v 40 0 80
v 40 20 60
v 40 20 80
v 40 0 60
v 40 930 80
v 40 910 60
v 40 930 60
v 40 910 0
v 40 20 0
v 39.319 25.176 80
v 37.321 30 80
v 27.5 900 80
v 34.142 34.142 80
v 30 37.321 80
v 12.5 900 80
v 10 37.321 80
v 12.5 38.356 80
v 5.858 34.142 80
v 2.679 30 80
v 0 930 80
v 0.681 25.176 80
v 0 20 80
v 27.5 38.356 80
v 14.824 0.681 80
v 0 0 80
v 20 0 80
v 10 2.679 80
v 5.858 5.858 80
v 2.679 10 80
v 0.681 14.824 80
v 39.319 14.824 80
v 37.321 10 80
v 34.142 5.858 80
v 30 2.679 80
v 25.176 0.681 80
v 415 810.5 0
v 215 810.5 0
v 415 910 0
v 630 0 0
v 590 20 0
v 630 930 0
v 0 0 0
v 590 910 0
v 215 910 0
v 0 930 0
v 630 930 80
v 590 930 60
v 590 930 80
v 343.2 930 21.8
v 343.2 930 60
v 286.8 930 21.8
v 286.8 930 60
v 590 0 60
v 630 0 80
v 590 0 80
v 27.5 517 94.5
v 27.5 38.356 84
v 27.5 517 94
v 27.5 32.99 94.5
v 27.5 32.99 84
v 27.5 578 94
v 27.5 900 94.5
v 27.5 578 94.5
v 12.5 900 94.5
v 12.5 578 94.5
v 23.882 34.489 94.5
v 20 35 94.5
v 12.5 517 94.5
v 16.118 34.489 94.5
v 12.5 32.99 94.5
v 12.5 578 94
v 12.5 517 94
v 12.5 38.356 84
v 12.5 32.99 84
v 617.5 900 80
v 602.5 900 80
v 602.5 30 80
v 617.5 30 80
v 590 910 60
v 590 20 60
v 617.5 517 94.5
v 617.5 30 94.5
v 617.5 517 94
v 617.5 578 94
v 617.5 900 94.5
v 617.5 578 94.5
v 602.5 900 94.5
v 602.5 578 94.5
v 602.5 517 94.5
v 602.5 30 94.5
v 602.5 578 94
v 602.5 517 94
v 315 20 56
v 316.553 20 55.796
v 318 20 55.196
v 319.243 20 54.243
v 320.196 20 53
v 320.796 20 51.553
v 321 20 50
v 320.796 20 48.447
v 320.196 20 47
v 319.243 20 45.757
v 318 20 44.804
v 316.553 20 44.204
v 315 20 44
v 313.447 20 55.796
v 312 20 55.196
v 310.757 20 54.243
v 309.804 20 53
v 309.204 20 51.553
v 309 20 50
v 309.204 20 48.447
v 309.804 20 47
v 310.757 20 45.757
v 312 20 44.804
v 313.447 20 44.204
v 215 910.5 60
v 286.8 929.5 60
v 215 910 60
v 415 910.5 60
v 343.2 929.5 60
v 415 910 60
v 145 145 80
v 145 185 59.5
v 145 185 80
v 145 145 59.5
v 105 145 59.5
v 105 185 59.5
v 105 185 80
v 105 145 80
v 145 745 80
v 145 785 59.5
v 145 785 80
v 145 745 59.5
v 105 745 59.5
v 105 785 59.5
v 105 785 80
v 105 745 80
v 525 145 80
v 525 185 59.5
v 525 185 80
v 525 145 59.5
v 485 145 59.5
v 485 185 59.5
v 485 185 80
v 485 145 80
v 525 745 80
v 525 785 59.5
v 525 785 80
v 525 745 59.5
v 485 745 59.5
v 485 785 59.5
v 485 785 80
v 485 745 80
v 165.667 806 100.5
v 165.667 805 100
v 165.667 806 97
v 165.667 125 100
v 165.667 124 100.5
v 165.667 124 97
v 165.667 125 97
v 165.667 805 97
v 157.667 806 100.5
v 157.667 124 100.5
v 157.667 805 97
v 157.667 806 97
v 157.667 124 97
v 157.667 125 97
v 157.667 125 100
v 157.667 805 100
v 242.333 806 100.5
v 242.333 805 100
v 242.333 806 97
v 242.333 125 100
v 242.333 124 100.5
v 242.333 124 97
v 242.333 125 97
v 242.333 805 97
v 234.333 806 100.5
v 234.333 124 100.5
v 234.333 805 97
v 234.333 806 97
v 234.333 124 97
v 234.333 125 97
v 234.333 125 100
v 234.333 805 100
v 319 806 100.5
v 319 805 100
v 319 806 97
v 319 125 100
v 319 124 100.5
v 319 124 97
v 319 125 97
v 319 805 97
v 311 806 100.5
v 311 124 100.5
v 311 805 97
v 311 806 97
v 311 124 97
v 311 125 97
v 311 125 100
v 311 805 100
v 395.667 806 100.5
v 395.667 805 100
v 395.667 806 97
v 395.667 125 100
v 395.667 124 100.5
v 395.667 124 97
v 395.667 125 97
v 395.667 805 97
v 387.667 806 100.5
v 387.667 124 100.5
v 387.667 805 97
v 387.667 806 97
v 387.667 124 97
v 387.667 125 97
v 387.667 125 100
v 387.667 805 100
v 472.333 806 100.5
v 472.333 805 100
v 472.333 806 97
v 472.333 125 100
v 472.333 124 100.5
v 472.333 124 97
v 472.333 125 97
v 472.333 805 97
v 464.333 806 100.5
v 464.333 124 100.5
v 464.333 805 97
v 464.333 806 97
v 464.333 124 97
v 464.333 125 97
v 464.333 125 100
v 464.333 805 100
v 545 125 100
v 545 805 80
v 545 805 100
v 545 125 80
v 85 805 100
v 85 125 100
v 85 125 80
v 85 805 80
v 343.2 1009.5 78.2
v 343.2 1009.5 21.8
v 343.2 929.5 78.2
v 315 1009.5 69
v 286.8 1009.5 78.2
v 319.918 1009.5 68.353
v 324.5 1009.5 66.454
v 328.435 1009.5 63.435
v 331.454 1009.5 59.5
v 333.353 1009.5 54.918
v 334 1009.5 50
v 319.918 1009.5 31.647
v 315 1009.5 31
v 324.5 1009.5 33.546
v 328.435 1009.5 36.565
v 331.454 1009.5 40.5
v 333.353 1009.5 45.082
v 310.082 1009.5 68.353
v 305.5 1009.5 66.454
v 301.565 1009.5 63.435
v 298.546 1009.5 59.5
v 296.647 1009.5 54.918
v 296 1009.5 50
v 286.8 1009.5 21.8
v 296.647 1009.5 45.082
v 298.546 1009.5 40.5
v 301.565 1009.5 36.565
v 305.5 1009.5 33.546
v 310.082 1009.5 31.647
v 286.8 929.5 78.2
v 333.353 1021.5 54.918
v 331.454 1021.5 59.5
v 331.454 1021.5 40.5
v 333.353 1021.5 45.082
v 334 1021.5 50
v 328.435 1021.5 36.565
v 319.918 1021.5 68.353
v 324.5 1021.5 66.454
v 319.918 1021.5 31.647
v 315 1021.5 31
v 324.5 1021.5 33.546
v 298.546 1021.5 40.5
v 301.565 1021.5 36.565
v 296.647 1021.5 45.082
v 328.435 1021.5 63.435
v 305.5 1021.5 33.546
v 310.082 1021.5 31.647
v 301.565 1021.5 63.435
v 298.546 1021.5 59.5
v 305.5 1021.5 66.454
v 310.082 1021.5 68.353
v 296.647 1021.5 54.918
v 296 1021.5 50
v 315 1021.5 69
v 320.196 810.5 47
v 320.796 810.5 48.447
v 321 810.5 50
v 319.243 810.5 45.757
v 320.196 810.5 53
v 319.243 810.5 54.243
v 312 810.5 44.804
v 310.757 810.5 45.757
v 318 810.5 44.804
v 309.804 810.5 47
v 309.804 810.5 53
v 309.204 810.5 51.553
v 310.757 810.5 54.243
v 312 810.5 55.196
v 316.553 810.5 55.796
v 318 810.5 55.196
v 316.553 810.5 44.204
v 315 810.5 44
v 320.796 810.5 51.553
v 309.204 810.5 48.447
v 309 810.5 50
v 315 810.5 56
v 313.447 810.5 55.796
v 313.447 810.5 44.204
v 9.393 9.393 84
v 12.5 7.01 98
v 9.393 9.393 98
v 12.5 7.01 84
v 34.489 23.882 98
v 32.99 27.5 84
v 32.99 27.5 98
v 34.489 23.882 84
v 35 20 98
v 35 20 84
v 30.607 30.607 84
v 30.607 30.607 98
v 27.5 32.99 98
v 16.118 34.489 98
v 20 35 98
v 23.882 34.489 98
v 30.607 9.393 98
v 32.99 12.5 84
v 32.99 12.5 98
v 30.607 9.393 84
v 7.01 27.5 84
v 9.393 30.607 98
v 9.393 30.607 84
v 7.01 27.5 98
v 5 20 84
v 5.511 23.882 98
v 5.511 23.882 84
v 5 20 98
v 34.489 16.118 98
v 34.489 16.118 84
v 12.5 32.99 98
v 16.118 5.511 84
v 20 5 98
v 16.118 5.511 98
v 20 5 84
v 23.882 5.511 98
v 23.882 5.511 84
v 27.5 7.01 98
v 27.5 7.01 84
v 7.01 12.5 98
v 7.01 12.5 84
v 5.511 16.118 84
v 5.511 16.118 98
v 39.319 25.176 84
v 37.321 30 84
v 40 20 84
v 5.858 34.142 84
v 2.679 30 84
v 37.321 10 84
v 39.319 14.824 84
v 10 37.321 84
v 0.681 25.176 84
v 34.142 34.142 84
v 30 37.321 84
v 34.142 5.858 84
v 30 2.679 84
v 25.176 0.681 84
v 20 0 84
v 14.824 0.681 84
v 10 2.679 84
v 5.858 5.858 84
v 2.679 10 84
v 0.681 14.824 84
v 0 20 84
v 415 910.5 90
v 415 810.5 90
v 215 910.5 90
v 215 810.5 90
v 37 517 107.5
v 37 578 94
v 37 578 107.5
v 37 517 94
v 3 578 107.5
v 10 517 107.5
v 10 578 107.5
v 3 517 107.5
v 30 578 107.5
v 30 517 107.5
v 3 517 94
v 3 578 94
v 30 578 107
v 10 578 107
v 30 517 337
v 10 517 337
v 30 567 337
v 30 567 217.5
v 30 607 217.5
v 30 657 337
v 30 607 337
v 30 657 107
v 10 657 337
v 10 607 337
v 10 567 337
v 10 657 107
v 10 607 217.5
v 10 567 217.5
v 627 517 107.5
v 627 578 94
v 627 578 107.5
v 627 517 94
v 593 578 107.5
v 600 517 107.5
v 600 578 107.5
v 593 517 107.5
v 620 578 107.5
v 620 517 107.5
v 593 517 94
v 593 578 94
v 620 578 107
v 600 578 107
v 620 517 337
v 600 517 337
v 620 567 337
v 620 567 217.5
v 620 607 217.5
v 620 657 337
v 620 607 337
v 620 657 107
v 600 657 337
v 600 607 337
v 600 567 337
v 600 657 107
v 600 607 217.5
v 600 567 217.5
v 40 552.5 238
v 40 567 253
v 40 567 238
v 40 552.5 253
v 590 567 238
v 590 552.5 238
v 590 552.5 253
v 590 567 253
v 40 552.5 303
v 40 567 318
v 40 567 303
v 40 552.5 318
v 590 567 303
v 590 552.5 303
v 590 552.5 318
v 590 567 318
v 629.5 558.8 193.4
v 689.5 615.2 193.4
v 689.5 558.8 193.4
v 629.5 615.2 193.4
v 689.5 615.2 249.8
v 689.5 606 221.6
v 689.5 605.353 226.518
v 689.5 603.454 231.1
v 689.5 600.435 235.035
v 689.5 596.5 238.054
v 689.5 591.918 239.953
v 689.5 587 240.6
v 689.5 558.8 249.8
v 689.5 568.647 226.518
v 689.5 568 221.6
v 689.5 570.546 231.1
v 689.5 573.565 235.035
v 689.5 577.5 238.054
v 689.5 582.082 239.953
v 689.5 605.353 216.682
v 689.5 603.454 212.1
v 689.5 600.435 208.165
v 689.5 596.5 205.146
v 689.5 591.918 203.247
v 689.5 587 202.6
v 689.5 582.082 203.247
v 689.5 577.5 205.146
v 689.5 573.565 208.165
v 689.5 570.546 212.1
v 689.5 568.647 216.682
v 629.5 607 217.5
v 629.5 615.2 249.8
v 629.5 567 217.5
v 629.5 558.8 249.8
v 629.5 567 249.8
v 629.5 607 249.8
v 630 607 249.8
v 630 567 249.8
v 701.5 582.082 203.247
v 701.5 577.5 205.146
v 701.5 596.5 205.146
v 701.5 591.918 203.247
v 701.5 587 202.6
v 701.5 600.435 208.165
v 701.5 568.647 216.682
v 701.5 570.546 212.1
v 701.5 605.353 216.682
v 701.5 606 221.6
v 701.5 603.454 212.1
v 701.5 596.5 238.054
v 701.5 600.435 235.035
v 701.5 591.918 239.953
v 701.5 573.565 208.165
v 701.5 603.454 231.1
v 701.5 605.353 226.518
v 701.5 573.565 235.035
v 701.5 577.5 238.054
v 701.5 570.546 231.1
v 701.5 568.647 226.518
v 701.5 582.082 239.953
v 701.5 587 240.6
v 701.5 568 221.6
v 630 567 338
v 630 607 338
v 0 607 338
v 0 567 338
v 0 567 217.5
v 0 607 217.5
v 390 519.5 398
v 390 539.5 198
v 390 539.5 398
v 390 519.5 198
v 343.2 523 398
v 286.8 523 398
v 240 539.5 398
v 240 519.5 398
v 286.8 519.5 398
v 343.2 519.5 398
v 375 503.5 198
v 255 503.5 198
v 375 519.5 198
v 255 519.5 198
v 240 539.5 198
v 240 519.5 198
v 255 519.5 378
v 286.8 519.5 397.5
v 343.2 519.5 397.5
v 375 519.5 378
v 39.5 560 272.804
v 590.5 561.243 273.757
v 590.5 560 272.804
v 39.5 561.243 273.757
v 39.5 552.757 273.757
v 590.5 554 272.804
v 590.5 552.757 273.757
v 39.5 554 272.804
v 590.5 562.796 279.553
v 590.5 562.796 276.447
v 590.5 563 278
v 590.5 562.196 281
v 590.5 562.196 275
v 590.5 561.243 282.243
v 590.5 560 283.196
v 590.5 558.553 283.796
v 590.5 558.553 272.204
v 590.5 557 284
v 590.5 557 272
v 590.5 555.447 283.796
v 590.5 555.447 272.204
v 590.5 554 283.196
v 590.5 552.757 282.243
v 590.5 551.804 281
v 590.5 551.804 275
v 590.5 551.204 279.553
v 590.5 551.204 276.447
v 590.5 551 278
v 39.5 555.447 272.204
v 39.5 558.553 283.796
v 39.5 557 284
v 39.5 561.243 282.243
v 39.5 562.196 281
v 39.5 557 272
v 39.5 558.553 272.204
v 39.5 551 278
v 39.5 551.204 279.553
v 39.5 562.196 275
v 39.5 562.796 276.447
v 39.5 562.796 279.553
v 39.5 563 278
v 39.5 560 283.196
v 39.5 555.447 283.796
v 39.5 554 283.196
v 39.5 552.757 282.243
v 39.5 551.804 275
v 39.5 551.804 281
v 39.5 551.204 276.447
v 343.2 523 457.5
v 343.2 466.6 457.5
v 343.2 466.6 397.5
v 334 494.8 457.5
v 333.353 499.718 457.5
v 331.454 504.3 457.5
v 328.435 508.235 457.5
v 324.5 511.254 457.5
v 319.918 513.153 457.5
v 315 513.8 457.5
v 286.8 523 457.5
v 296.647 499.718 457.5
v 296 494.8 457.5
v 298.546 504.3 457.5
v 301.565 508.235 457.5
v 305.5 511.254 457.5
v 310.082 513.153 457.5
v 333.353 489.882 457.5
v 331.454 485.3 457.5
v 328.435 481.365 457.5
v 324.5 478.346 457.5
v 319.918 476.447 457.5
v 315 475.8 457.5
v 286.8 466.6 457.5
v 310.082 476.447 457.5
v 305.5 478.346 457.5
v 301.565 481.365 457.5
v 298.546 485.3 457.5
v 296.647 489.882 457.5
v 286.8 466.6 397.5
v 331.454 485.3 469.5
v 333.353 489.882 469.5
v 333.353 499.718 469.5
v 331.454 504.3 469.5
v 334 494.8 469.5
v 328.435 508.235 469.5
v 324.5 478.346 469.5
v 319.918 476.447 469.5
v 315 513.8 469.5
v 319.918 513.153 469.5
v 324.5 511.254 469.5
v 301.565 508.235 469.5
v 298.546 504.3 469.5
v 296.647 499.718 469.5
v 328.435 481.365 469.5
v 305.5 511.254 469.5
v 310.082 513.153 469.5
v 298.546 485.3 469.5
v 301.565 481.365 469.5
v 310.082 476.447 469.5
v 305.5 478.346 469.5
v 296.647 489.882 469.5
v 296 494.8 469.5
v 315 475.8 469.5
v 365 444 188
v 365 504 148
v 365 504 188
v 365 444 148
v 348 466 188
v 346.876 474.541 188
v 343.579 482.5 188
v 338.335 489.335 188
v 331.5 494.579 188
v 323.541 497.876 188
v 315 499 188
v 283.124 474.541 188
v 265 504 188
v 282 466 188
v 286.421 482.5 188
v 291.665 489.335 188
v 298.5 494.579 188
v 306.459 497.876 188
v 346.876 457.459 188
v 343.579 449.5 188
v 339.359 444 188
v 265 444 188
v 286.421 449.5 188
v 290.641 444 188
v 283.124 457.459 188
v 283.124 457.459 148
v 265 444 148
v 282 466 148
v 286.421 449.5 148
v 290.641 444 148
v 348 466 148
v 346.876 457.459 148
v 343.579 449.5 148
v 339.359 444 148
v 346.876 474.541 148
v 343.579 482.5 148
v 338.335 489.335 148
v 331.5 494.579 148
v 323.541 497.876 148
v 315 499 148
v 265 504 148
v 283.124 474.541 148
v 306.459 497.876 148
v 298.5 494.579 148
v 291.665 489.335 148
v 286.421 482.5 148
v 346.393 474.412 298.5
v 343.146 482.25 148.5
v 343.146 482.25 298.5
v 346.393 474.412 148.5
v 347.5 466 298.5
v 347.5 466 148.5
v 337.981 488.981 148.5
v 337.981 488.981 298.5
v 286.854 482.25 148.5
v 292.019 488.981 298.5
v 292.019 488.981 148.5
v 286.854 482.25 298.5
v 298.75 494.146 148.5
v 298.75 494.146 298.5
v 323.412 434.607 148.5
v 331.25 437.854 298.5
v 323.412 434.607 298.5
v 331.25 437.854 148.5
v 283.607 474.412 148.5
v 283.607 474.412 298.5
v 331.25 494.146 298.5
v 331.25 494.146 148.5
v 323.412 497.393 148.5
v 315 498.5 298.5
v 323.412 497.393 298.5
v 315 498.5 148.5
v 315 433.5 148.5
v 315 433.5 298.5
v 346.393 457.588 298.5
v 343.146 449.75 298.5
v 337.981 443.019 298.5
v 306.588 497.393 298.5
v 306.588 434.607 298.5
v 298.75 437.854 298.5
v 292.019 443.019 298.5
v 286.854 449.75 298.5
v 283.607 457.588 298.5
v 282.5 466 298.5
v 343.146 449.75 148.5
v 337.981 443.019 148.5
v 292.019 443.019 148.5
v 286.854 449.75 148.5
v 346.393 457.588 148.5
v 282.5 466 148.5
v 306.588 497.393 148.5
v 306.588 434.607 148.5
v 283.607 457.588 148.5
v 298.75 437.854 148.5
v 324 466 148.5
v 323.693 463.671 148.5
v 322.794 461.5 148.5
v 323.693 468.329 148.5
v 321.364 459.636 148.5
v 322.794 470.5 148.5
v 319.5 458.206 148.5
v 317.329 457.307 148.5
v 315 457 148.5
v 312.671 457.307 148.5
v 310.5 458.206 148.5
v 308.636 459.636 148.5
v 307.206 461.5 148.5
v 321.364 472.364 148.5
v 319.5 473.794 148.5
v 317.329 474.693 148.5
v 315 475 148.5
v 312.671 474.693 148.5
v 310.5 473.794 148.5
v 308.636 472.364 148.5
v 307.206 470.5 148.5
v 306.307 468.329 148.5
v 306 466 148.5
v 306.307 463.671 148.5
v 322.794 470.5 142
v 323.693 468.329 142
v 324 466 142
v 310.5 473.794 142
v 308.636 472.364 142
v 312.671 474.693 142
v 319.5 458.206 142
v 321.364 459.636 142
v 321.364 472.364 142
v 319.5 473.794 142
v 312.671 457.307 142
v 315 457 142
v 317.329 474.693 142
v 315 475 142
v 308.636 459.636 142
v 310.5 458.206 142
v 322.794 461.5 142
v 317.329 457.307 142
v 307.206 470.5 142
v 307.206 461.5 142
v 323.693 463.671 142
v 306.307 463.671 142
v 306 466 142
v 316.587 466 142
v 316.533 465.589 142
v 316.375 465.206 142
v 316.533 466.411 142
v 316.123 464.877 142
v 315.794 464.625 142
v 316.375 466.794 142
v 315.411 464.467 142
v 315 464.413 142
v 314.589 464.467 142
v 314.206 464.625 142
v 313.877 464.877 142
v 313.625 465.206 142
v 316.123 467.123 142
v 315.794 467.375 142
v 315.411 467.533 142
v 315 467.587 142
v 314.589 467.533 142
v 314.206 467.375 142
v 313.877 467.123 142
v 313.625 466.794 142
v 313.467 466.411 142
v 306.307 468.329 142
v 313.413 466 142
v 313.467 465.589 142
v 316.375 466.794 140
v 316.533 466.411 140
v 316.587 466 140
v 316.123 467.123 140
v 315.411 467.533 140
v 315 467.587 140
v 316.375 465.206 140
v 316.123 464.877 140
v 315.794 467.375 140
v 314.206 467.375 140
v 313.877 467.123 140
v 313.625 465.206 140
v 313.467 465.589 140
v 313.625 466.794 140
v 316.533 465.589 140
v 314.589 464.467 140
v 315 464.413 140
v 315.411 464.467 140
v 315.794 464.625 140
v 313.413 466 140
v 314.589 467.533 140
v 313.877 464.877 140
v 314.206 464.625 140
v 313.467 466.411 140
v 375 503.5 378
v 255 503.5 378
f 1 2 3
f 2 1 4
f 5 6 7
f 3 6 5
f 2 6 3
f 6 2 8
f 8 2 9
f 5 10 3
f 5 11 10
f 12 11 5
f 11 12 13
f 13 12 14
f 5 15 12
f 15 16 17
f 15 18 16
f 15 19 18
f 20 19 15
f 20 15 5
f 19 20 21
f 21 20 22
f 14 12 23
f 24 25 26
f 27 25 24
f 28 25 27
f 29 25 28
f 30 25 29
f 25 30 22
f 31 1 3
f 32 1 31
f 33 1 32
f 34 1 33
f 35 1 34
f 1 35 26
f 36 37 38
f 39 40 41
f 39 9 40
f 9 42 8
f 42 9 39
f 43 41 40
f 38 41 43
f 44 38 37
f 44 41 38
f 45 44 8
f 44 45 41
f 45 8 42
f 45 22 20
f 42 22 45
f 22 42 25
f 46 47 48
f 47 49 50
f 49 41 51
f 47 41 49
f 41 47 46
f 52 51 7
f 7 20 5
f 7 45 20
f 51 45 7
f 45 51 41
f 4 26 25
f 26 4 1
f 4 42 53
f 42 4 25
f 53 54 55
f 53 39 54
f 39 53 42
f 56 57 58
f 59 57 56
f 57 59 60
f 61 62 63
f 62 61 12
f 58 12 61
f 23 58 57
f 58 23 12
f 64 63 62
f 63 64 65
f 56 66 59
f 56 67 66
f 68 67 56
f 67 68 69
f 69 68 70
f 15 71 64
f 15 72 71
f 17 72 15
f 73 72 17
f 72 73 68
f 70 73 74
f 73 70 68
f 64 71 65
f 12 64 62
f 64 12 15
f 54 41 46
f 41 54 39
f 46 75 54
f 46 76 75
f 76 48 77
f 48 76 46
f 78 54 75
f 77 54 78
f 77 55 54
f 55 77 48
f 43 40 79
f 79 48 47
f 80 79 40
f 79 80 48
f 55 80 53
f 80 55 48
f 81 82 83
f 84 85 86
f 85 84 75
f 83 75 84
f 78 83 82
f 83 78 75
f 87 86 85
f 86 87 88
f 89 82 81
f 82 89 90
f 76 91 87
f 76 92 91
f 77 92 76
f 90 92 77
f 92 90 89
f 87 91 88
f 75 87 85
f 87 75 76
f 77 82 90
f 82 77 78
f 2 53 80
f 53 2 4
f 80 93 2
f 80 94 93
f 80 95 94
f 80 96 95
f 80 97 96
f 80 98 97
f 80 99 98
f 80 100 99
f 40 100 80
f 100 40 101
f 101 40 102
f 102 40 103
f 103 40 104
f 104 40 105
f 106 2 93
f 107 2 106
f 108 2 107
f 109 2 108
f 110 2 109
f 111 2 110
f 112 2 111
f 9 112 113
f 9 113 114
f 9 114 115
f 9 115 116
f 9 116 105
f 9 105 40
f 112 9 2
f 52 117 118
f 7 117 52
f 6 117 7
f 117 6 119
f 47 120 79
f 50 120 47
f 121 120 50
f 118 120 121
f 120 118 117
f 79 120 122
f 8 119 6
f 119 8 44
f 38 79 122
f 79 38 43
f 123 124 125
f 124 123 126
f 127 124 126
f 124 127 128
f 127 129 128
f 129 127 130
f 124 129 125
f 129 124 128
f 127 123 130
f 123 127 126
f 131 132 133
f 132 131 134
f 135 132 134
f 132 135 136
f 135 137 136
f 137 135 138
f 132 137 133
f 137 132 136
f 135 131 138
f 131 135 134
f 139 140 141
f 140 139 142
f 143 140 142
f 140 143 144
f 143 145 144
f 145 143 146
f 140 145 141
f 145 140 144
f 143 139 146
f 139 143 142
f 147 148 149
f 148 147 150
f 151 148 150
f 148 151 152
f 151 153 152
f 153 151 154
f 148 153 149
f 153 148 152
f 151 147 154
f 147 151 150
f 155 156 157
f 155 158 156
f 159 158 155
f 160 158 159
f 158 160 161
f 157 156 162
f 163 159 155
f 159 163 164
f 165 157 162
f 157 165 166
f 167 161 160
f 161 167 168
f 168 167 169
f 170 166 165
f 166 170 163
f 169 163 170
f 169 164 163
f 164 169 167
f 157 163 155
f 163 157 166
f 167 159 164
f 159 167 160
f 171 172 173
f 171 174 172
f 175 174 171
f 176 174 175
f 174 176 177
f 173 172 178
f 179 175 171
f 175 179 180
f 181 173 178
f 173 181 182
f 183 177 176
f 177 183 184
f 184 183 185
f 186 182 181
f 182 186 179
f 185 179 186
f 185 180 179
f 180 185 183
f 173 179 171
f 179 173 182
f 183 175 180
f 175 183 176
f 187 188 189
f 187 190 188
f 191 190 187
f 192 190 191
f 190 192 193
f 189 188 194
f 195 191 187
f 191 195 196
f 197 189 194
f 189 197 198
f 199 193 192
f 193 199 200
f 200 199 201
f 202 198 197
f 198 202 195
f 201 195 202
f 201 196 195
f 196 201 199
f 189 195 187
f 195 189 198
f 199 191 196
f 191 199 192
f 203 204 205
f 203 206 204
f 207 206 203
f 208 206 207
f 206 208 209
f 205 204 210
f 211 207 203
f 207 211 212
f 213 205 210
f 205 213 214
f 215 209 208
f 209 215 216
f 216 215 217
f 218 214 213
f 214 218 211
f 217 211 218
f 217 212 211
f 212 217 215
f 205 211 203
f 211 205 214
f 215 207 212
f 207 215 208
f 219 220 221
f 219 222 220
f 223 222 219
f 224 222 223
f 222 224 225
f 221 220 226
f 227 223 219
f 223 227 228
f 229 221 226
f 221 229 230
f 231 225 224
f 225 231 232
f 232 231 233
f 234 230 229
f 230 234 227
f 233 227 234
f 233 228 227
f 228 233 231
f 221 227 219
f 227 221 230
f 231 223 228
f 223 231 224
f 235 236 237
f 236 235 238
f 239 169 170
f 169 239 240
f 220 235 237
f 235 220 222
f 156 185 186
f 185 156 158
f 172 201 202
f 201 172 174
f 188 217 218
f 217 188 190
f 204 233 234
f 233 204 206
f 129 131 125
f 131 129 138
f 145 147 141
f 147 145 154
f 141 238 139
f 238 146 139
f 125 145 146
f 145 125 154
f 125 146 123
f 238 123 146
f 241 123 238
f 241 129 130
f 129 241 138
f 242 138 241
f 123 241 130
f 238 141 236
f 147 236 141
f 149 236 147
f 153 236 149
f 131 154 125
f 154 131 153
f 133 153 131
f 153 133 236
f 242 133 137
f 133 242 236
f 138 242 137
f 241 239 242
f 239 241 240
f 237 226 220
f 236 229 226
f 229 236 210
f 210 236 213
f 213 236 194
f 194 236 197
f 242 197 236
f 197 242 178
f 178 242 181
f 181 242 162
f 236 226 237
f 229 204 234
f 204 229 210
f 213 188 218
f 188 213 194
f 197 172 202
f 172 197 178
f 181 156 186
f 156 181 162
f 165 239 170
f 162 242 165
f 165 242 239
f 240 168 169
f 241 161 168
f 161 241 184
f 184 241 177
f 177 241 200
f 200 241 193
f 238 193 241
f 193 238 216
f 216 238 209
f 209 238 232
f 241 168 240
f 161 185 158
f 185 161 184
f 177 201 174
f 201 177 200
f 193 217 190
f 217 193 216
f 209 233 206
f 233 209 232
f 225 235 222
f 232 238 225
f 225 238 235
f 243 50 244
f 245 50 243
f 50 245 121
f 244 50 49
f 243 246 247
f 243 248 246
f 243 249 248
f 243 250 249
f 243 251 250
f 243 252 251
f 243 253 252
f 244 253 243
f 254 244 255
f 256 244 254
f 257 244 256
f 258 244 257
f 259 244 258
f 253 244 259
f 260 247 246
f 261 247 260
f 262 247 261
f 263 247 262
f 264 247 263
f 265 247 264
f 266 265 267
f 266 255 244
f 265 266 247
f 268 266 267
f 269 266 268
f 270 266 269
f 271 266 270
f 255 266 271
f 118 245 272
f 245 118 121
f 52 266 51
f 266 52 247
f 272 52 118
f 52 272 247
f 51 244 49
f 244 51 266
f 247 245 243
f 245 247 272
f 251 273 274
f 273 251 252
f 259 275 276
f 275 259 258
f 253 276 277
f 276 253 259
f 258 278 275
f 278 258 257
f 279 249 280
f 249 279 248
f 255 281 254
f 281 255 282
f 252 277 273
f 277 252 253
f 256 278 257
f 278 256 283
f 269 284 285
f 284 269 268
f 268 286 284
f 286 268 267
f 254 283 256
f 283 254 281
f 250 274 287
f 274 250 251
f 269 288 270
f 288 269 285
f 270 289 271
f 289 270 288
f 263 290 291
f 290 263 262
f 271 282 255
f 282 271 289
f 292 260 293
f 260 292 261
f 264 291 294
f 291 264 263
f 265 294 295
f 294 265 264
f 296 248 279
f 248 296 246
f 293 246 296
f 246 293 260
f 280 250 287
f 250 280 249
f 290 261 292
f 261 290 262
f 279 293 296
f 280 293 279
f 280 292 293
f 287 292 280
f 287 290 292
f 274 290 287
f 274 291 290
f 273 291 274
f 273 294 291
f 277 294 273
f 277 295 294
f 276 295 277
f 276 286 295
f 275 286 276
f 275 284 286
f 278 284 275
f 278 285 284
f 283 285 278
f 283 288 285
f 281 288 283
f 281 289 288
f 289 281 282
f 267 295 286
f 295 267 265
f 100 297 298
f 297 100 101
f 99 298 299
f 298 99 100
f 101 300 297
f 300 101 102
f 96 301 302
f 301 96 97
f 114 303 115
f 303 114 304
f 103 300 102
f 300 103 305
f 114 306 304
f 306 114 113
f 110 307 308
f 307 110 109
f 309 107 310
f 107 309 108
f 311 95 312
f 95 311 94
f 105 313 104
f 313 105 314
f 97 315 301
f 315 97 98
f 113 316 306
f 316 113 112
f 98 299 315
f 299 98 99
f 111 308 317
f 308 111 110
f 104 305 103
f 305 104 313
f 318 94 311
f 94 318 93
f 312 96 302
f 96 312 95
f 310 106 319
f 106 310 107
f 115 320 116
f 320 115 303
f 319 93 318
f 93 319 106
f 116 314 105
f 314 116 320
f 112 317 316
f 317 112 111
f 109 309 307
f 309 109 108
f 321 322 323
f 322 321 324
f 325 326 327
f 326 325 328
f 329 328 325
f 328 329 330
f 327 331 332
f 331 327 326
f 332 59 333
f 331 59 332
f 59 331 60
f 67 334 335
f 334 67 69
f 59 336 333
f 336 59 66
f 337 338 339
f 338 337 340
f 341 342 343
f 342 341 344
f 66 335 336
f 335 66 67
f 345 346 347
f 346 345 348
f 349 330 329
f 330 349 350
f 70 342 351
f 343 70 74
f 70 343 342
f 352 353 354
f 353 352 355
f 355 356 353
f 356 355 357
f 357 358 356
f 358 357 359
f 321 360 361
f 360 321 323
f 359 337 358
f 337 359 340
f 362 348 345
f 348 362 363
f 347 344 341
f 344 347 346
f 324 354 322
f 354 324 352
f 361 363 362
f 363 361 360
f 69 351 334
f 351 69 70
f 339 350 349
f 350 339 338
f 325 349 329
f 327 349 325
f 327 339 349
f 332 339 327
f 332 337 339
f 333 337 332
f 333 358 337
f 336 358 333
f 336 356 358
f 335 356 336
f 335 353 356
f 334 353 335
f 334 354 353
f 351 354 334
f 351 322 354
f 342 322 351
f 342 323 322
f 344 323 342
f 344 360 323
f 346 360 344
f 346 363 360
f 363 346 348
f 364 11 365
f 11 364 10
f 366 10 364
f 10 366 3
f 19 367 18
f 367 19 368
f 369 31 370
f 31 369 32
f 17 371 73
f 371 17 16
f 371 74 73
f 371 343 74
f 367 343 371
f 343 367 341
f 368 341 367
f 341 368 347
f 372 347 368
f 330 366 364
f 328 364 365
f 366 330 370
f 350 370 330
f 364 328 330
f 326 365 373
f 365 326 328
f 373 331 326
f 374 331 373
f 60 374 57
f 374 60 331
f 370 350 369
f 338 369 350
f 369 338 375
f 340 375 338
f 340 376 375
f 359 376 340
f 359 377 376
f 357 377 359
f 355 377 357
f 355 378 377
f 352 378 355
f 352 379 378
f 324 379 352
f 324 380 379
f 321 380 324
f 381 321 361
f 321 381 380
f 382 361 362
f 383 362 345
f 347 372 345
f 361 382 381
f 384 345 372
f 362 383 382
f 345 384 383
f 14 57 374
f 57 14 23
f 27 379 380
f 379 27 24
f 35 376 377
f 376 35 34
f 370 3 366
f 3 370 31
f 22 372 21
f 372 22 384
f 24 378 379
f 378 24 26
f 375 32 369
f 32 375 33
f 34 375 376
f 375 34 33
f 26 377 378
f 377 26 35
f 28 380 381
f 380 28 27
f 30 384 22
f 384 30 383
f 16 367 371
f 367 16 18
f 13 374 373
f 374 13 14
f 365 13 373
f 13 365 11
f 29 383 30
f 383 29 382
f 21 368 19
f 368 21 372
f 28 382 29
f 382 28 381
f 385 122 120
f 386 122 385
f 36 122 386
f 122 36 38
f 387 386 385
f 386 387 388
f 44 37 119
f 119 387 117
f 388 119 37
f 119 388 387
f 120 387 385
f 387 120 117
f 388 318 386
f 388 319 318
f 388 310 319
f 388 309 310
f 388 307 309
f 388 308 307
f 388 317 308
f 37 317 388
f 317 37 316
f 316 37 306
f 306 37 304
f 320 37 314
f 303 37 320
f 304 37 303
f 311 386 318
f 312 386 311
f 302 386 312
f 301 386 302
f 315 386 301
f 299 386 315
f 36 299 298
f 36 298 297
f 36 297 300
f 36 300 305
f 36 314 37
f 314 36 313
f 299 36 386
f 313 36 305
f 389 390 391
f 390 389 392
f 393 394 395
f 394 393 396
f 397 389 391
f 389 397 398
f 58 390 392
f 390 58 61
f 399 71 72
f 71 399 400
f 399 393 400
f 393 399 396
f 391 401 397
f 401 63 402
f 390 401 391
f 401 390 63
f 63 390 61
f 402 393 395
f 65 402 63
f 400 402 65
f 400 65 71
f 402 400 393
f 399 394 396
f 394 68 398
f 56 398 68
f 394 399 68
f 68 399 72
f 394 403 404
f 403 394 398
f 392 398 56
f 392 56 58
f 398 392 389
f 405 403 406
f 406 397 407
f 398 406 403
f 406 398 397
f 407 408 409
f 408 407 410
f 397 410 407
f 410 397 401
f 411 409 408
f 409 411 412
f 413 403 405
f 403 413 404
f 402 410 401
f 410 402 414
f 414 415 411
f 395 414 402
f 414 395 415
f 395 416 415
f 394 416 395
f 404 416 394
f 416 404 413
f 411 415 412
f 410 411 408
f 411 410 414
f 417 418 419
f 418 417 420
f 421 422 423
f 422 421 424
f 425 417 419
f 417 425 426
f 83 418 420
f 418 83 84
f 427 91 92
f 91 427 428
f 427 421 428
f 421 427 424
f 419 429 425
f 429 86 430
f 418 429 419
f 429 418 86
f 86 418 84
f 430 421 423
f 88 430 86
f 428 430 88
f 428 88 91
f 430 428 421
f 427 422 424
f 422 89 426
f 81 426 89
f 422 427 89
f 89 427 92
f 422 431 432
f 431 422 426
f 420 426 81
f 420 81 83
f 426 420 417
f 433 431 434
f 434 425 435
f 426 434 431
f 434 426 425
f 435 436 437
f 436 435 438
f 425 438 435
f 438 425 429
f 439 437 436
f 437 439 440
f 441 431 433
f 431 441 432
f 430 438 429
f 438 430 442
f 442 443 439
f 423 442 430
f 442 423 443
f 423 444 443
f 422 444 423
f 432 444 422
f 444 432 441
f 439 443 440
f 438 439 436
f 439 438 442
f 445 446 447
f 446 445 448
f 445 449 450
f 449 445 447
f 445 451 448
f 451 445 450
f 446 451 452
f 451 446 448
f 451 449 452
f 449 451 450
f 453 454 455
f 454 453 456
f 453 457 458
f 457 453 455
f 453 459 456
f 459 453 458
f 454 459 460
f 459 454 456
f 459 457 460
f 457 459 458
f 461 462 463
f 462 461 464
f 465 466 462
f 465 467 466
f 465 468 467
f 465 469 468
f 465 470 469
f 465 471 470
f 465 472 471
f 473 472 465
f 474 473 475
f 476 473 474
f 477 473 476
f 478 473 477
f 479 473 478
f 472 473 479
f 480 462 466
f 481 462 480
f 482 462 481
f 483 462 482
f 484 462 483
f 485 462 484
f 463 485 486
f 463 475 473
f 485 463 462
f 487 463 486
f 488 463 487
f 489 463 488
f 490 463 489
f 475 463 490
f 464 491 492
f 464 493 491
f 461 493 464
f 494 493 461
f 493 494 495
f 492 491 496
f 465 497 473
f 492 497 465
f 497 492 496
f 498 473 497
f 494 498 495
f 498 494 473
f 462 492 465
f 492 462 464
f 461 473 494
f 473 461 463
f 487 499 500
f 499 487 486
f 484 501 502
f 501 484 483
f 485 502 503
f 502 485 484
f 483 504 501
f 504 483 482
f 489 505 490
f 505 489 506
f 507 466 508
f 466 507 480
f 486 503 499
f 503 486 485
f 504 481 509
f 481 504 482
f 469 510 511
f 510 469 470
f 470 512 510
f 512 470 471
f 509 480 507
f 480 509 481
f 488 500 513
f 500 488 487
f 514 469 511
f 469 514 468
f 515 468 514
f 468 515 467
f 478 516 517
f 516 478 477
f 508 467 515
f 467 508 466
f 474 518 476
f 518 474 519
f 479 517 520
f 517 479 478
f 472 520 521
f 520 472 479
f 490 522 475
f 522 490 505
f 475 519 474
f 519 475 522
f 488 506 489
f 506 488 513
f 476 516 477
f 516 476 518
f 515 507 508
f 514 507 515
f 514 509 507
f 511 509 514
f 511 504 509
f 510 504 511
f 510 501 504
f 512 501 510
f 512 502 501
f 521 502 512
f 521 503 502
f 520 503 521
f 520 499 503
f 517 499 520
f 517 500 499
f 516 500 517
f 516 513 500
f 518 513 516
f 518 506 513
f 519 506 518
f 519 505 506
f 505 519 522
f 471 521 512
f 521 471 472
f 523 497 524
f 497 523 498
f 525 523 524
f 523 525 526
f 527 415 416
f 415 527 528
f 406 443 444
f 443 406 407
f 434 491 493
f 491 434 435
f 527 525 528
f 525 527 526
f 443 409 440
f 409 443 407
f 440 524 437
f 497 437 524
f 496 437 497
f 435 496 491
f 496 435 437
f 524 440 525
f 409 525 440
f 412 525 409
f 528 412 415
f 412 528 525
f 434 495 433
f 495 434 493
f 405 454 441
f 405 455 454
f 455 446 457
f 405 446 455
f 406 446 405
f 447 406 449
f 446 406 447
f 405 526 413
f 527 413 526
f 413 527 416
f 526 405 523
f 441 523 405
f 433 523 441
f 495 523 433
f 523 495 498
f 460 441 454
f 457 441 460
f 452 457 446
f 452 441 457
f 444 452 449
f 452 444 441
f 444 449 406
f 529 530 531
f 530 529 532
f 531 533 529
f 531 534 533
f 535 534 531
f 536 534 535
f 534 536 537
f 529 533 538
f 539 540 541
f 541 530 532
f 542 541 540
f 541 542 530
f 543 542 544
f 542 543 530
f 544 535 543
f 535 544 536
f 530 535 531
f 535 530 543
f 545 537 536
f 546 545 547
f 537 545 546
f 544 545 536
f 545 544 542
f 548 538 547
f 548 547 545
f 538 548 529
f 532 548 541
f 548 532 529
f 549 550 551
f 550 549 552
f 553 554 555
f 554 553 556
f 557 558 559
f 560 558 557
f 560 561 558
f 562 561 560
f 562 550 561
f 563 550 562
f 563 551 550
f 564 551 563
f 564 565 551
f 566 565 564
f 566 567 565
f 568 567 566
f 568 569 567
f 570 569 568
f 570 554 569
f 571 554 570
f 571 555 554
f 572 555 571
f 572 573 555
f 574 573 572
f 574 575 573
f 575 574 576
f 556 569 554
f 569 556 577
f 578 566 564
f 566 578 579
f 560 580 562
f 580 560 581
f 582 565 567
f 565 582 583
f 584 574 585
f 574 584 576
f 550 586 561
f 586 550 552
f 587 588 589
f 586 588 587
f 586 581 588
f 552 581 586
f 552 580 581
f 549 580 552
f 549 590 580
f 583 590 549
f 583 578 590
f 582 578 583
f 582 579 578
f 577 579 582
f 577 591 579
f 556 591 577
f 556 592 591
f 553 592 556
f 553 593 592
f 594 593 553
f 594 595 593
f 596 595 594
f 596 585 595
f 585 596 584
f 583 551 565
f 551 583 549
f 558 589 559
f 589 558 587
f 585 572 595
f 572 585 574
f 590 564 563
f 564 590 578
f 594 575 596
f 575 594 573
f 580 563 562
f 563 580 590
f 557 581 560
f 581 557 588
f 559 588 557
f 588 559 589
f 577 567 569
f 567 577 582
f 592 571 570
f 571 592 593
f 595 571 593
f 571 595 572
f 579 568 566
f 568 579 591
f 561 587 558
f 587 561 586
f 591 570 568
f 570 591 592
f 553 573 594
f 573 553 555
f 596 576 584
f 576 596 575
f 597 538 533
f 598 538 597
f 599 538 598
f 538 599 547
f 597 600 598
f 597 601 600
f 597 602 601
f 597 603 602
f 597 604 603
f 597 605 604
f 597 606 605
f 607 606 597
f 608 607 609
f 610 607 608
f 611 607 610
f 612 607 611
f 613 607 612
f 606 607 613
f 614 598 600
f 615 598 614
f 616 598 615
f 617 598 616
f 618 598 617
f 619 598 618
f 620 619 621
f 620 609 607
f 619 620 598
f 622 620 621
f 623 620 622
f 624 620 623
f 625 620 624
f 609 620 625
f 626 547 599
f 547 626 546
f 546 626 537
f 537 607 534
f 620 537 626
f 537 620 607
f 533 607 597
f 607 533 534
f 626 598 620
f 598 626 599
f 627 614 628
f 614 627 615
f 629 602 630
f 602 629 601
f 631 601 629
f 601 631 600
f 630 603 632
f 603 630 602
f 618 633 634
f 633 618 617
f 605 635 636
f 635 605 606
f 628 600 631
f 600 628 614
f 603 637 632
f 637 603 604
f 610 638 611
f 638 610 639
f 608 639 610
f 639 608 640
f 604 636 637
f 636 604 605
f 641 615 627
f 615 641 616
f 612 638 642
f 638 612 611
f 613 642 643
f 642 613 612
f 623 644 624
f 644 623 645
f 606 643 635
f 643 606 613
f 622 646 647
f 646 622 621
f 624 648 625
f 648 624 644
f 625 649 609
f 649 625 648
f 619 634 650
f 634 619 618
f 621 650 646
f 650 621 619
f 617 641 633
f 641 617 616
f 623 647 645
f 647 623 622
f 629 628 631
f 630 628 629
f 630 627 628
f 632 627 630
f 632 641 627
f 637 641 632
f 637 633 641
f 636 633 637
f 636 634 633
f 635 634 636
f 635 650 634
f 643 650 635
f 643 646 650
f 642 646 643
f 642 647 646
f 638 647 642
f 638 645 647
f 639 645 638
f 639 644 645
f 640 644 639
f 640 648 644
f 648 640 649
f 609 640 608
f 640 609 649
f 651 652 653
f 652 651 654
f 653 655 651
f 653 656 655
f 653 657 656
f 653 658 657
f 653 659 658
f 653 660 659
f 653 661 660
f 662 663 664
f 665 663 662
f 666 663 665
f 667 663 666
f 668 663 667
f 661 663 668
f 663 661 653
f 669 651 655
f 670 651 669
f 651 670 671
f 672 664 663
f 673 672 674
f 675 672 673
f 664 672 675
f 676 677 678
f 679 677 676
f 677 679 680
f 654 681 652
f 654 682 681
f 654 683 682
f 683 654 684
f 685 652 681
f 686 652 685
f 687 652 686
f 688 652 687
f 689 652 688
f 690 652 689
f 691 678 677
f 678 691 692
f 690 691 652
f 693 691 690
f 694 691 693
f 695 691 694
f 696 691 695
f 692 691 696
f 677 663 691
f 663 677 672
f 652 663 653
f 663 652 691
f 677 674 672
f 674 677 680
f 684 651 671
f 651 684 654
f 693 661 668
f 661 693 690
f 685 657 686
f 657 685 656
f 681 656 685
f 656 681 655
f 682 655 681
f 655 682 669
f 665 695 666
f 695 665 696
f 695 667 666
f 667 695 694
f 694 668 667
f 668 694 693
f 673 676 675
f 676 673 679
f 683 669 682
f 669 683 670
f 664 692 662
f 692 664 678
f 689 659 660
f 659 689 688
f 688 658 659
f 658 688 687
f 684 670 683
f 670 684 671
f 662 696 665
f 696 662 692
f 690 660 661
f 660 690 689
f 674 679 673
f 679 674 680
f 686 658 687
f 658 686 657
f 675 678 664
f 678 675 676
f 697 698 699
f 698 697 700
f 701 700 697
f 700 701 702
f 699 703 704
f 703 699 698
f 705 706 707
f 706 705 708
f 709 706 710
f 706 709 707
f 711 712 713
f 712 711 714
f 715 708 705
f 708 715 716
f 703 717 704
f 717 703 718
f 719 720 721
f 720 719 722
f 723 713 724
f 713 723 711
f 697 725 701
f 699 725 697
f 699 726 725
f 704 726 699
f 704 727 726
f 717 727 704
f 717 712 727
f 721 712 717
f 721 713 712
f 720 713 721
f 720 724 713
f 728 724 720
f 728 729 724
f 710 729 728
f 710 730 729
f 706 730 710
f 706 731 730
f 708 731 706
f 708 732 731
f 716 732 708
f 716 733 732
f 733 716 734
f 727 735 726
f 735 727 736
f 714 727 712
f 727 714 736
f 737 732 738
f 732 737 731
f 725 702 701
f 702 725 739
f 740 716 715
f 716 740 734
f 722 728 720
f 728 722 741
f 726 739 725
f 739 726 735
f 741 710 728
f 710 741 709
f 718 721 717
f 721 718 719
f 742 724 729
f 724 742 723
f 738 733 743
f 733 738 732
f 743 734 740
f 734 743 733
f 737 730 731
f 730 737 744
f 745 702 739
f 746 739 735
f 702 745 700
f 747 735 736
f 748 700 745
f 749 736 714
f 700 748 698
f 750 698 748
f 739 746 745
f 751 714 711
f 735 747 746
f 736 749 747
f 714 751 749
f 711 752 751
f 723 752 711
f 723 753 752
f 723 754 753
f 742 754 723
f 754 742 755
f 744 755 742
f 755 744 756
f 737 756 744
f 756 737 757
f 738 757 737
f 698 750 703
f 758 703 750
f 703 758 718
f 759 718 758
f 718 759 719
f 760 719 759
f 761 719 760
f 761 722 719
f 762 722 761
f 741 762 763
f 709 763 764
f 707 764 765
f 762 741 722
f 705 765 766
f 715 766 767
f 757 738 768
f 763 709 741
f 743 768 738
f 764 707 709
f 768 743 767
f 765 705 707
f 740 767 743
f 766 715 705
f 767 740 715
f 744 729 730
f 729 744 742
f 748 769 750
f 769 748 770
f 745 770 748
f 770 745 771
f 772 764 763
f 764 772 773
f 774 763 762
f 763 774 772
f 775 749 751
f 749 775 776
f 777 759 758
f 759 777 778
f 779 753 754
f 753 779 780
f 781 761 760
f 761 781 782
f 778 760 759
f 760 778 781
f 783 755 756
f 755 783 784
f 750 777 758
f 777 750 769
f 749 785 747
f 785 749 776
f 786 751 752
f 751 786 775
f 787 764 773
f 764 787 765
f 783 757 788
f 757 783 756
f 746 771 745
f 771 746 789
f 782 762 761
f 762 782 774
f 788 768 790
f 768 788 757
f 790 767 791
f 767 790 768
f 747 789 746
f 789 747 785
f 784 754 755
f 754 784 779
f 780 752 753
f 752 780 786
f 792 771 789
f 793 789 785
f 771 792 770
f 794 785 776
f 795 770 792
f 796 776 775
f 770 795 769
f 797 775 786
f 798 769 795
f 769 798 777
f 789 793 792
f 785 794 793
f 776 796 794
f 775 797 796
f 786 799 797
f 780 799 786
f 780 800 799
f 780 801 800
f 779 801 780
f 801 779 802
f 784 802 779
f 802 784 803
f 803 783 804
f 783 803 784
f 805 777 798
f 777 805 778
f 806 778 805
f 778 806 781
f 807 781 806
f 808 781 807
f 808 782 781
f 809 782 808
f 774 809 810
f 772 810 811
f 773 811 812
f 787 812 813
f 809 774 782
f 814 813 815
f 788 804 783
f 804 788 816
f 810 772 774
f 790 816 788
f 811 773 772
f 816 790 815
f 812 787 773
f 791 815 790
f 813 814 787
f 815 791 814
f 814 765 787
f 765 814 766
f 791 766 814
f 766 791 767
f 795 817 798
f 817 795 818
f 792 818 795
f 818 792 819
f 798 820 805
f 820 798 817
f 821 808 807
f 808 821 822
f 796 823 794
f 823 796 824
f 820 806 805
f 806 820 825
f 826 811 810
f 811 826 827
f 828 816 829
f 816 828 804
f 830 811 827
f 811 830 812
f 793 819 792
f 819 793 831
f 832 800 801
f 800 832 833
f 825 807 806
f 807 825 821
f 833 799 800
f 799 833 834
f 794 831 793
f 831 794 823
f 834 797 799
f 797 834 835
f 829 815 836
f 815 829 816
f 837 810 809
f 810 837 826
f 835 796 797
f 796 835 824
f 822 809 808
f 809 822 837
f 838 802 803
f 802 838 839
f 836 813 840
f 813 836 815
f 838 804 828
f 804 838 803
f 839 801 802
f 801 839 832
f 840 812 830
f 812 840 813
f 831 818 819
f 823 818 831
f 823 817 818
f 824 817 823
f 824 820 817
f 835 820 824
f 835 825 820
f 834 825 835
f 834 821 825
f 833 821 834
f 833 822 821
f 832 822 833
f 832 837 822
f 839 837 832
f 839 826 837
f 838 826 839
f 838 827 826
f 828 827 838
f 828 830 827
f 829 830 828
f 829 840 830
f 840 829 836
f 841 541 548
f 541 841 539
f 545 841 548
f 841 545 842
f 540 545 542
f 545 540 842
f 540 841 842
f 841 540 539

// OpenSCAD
// AnoleX 4060-Evo Ultra 2, a desktop CNC router, as a workshop model.
//
// Built from published dimensions, not from anyone's mesh: a moving-table
// router cutting 400 x 600 x 80 mm, on a base of two aluminium side beams
// carrying the Y rails, the T-slot table riding them between the beams, a
// gantry of two plates and a cross beam standing on the beams, the X carriage
// on the beam's front face, the Z plate on the carriage, and an 800 W trim
// router in a 65 mm clamp on the Z plate. The table carries the work under the
// tool along Y, as the maker's manual has it (parts/anolex_4060_evo_ultra_2/
// manual.json: the gantry is fixed to the Y-axis base, page 05). The control box sits at the back of the base,
// between the beams, its sockets facing the rear.
//
// The origin is the front-left bottom corner of the base frame; X runs right,
// Y runs back, Z runs up -- the site's machine convention. The table top is at
// table_top_z; the 400 x 600 working area sits centred on the table, and the
// tool stands over the middle of the table's travel, y_rest along it: the
// table is moved back and forth under it, so at y_axis = 0 the working area's
// front edge is under the tool and at y_axis = 600 its back edge is.
//
// Every dimension that is a published specification is named as such; the
// rest are taken from the maker's listed footprint or chosen to look right,
// and say so. Nothing here is a trademark: "4060-Evo Ultra 2" names what the
// part models.

// Customizer parameters (where the axes are shown standing)
x_axis = 200;   // [0:1:400] Where the tool stands along X, in work coordinates (mm)
y_axis = 300;   // [0:1:600] Where the table stands along Y, in work coordinates: the work's Y under the tool (mm)
z_axis = 40;    // [0:1:80] Tool tip height above the table (mm)
with_router = true;   // Draw the trim router in its clamp

/* [Hidden] */
$fn = 24;
eps = 0.5;   // how far a part sinks into what it stands on: a union of parts that
             // merely touch exports as a mesh OpenSCAD 2021.01 will not read back

// --- published specifications (AnoleX) ---
work_x = 400; work_y = 600; work_z = 80;   // the working area; Z is the 4030-Evo Ultra 2's, the same gantry
rail_w = 15; rail_h = 15;                  // HGH15 linear rail, two per axis
block = [34, 61, 28];                      // an HGH15 carriage block: width, length, height over the rail's base
screw_d = 12;                              // 1204 ball screw: 12 mm, 4 mm lead
nema = 56.4; motor_len = 80;               // NEMA 23 closed-loop steppers (the length is a usual one)
router_d = 65; router_len = 150;           // the 800 W trim router: a 65 mm body in a 65 mm clamp

// --- the base: sized from the maker's listed 4030 footprint (24.8 in wide and
// 20.47 in high) plus the 300 mm the 4060 base adds along Y; the maker lists no
// overall size for the 4060 itself ---
frame_w = 630;      // outer width of the base
frame_d = 930;      // outer depth of the base
beam = [40, 80];    // the side beams: aluminium profile, 40 wide and 80 tall
cross_t = 20;       // the front and rear cross plates
table = [460, 680, 20];        // the T-slot table, a little larger than the work area
table_top_z = beam[1] + 20;    // the table stands on supports above the beams' top

// --- the gantry: chosen to clear 80 mm of Z travel over the table ---
leg = [20, 140, 230];          // each gantry leg: a plate standing on its Y block
beam_x = [40, 120];            // the cross beam: 40 deep, 120 tall
carriage = [150, 20, 200];     // the X carriage plate on the beam's front face
z_plate = [120, 16, 180];      // the Z plate riding the carriage's Z rails
clamp = [100, 60, 40];         // the router clamp on the Z plate's front
clamp_bore = 8;                // the clamp's bore stands this far behind the clamp's centre line
collet = 8;                    // the collet nut and the tool's stick-out under the router's body
control_box = [200, 100, 90];  // the controller's enclosure at the back, between the beams

// where the working area starts, in the frame: centred on the table
function work_x0() = (frame_w - work_x) / 2;
function table_y0() = (frame_d - table[1]) / 2;
function work_y0() = table_y0() + (table[1] - work_y) / 2;
// the tool stands still along Y, over the middle of the table's travel; the
// table is moved by how far the work's Y under the tool is from there
y_rest = work_y / 2;
function table_dy() = y_rest - y_axis;
// where the tool stands in the frame, for the axes as set
function tool_x() = work_x0() + x_axis;
function tool_y() = work_y0() + y_rest;
function tool_z() = table_top_z + z_axis;
// the gantry's legs and beam stand behind the tool: from the tool back, the
// clamp's bore to its centre, the clamp's back half, the Z plate, the X
// carriage, the X blocks on the beam's front face, and the beam's half depth
// to its centre line
function beam_y() = tool_y() + clamp_bore + clamp[1] / 2 + z_plate[1] + carriage[1] + block[2] + beam_x[0] / 2;

module hgh15_rail(len, along_y = true) {
    // a rail with its row of bolt holes left out: at bench scale a bar
    color("gainsboro") if (along_y) cube([rail_w, len, rail_h]); else cube([len, rail_w, rail_h]);
}

module hgh15_block(along_y = true) {
    // a carriage block over its rail, sunk a little into it
    color("darkslategray") translate([0, 0, rail_h - eps])
        if (along_y) translate([-(block[0] - rail_w) / 2, 0, 0]) cube([block[0], block[1], block[2] - rail_h + eps]);
        else translate([0, -(block[0] - rail_w) / 2, 0]) cube([block[1], block[0], block[2] - rail_h + eps]);
}

module nema23(len = motor_len) {
    // a NEMA 23 motor along +Z from its flange, with the encoder cap of a closed-loop one
    color("dimgray") cube([nema, nema, len]);
    color("black") translate([nema / 2, nema / 2, len - eps]) cylinder(d = 38, h = 12 + eps);
}

module anolex_base() {
    // the two side beams, the full depth, carrying the Y rails
    for (x = [0, frame_w - beam[0]]) translate([x, 0, 0]) {
        color("silver") cube([beam[0], frame_d, beam[1]]);
        translate([(beam[0] - rail_w) / 2, 30, beam[1] - eps]) hgh15_rail(frame_d - 60);
    }
    // the front and rear cross plates between the beams, sunk into them
    for (y = [0, frame_d - cross_t]) translate([beam[0] - eps, y, 0])
        color("silver") cube([frame_w - 2 * beam[0] + 2 * eps, cross_t, beam[1] - 20]);
    // the table on four supports, carried along Y over the cross plates' level
    translate([(frame_w - table[0]) / 2, table_y0() + table_dy(), 0]) {
        color("darkgray") translate([0, 0, table_top_z - table[2]]) cube([table[0], table[1], table[2]]);
        color("silver") for (x = [20, table[0] - 60]) for (y = [20, table[1] - 60])
            translate([x, y, beam[1] - 20 - eps]) cube([40, 40, table_top_z - table[2] - (beam[1] - 20) + 2 * eps]);
        // the T-slots, as grooves along Y
        color("dimgray") for (i = [1 : 5]) translate([i * table[0] / 6 - 4, -1, table_top_z - 3]) cube([8, table[1] + 2, 3 + eps]);
    }
    // the Y ball screw under the table's centre line, and its motor behind the rear plate
    color("gainsboro") translate([frame_w / 2, cross_t - eps, beam[1] - 30]) rotate([-90, 0, 0]) cylinder(d = screw_d, h = frame_d - 2 * cross_t + 2 * eps);
    translate([frame_w / 2 - nema / 2, frame_d - eps, beam[1] - 30 + nema / 2]) rotate([-90, 0, 0]) nema23();
    // the emergency stop on the front-left beam, a red mushroom
    color("red") translate([beam[0] / 2, 20, beam[1] - eps]) cylinder(d = 30, h = 18 + eps);
    color("yellow") translate([beam[0] / 2, 20, beam[1] - eps]) cylinder(d = 40, h = 4 + eps);
}

module anolex_control_box() {
    // at the back, between the beams, standing on the floor; its USB and power
    // sockets face the rear, so the lead to the computer leaves behind the machine
    translate([(frame_w - control_box[0]) / 2, frame_d - cross_t - control_box[1] + eps, 0]) {
        color("black") cube(control_box);
        color("dimgray") translate([20, control_box[1] - 1, 30]) cube([12, 2, 8]);     // USB
        color("dimgray") translate([control_box[0] - 50, control_box[1] - 1, 20]) cube([30, 2, 25]);  // mains
    }
}

module anolex_gantry() {
    by = beam_y();
    // each leg stands on a foot block bolted to its side beam (the gantry does not move)
    for (x = [0, frame_w - beam[0]]) translate([x + (beam[0] - rail_w) / 2, by - leg[1] / 2, beam[1] - eps]) {
        hgh15_block();
        translate([-(block[0] - rail_w) / 2 + (block[0] - leg[0]) / 2, 0, block[2] - eps]) color("silver") cube(leg);
    }
    // the cross beam between the legs' tops, sunk a little into them
    translate([0, by - beam_x[0] / 2, beam[1] + block[2] + leg[2] - beam_x[1] - eps])
        color("silver") cube([frame_w, beam_x[0], beam_x[1] + eps]);
    // the two X rails on the beam's front face, the X carriage on their blocks
    bz = beam[1] + block[2] + leg[2] - beam_x[1];
    for (z = [bz + 20, bz + beam_x[1] - 20 - rail_h]) translate([beam[0], by - beam_x[0] / 2 - rail_h + eps, z]) rotate([90, 0, 0]) mirror([0, 0, 1]) hgh15_rail(frame_w - 2 * beam[0], along_y = false);
    cx = tool_x() - carriage[0] / 2;
    cy = by - beam_x[0] / 2 - block[2];
    color("silver") translate([cx, cy - carriage[1] + eps, bz - 20]) cube([carriage[0], carriage[1], carriage[2]]);
    // the X motor on the right end of the beam, its screw along the beam's front
    translate([frame_w - eps, by - beam_x[0] / 2 + (beam_x[0] - nema) / 2, bz + (beam_x[1] - nema) / 2]) rotate([0, 90, 0]) nema23(60);
    color("gainsboro") translate([beam[0] - eps, by - beam_x[0] / 2 - 10, bz + beam_x[1] / 2]) rotate([0, 90, 0]) cylinder(d = screw_d, h = frame_w - 2 * beam[0] + 2 * eps);
}

module anolex_z_axis() {
    by = beam_y();
    cy = by - beam_x[0] / 2 - block[2] - carriage[1];
    bz = beam[1] + block[2] + leg[2] - beam_x[1];
    // the Z plate rides two short rails on the carriage's front face; it is
    // z_axis up its travel, so the tool tip stands at tool_z()
    zy = cy - z_plate[1] + eps;
    zz = tool_z() + collet + clamp[2] + 10;   // the plate's bottom: above the clamp's top
    color("silver") translate([tool_x() - z_plate[0] / 2, zy, zz]) cube(z_plate);
    // the Z motor on top of the carriage, its screw down behind the plate
    translate([tool_x() - nema / 2, cy - nema + 4, bz - 20 + carriage[2] - eps]) nema23(60);
    // the clamp on the plate's front, holding the router's body above its collet
    color("dimgray") translate([tool_x() - clamp[0] / 2, zy - clamp[1] + eps, tool_z() + collet]) difference() {
        cube(clamp);
        translate([clamp[0] / 2, clamp[1] / 2 - clamp_bore, -1]) cylinder(d = router_d + 1, h = clamp[2] + 2);
    }
    if (with_router) translate([tool_x(), zy - clamp[1] / 2 - clamp_bore + eps, tool_z()]) {
        color("darkslateblue") translate([0, 0, collet + eps]) cylinder(d = router_d, h = router_len);
        color("silver") translate([0, 0, 2]) cylinder(d = 18, h = collet - 2 + 2 * eps);   // the collet nut
        color("gainsboro") cylinder(d = 3.175, h = collet + eps);                    // a 1/8 in tool, its tip at the table + z_axis
    }
}

module anolex_4060_evo_ultra_2() {
    anolex_base();
    anolex_control_box();
    anolex_gantry();
    anolex_z_axis();
}

anolex_4060_evo_ultra_2();
